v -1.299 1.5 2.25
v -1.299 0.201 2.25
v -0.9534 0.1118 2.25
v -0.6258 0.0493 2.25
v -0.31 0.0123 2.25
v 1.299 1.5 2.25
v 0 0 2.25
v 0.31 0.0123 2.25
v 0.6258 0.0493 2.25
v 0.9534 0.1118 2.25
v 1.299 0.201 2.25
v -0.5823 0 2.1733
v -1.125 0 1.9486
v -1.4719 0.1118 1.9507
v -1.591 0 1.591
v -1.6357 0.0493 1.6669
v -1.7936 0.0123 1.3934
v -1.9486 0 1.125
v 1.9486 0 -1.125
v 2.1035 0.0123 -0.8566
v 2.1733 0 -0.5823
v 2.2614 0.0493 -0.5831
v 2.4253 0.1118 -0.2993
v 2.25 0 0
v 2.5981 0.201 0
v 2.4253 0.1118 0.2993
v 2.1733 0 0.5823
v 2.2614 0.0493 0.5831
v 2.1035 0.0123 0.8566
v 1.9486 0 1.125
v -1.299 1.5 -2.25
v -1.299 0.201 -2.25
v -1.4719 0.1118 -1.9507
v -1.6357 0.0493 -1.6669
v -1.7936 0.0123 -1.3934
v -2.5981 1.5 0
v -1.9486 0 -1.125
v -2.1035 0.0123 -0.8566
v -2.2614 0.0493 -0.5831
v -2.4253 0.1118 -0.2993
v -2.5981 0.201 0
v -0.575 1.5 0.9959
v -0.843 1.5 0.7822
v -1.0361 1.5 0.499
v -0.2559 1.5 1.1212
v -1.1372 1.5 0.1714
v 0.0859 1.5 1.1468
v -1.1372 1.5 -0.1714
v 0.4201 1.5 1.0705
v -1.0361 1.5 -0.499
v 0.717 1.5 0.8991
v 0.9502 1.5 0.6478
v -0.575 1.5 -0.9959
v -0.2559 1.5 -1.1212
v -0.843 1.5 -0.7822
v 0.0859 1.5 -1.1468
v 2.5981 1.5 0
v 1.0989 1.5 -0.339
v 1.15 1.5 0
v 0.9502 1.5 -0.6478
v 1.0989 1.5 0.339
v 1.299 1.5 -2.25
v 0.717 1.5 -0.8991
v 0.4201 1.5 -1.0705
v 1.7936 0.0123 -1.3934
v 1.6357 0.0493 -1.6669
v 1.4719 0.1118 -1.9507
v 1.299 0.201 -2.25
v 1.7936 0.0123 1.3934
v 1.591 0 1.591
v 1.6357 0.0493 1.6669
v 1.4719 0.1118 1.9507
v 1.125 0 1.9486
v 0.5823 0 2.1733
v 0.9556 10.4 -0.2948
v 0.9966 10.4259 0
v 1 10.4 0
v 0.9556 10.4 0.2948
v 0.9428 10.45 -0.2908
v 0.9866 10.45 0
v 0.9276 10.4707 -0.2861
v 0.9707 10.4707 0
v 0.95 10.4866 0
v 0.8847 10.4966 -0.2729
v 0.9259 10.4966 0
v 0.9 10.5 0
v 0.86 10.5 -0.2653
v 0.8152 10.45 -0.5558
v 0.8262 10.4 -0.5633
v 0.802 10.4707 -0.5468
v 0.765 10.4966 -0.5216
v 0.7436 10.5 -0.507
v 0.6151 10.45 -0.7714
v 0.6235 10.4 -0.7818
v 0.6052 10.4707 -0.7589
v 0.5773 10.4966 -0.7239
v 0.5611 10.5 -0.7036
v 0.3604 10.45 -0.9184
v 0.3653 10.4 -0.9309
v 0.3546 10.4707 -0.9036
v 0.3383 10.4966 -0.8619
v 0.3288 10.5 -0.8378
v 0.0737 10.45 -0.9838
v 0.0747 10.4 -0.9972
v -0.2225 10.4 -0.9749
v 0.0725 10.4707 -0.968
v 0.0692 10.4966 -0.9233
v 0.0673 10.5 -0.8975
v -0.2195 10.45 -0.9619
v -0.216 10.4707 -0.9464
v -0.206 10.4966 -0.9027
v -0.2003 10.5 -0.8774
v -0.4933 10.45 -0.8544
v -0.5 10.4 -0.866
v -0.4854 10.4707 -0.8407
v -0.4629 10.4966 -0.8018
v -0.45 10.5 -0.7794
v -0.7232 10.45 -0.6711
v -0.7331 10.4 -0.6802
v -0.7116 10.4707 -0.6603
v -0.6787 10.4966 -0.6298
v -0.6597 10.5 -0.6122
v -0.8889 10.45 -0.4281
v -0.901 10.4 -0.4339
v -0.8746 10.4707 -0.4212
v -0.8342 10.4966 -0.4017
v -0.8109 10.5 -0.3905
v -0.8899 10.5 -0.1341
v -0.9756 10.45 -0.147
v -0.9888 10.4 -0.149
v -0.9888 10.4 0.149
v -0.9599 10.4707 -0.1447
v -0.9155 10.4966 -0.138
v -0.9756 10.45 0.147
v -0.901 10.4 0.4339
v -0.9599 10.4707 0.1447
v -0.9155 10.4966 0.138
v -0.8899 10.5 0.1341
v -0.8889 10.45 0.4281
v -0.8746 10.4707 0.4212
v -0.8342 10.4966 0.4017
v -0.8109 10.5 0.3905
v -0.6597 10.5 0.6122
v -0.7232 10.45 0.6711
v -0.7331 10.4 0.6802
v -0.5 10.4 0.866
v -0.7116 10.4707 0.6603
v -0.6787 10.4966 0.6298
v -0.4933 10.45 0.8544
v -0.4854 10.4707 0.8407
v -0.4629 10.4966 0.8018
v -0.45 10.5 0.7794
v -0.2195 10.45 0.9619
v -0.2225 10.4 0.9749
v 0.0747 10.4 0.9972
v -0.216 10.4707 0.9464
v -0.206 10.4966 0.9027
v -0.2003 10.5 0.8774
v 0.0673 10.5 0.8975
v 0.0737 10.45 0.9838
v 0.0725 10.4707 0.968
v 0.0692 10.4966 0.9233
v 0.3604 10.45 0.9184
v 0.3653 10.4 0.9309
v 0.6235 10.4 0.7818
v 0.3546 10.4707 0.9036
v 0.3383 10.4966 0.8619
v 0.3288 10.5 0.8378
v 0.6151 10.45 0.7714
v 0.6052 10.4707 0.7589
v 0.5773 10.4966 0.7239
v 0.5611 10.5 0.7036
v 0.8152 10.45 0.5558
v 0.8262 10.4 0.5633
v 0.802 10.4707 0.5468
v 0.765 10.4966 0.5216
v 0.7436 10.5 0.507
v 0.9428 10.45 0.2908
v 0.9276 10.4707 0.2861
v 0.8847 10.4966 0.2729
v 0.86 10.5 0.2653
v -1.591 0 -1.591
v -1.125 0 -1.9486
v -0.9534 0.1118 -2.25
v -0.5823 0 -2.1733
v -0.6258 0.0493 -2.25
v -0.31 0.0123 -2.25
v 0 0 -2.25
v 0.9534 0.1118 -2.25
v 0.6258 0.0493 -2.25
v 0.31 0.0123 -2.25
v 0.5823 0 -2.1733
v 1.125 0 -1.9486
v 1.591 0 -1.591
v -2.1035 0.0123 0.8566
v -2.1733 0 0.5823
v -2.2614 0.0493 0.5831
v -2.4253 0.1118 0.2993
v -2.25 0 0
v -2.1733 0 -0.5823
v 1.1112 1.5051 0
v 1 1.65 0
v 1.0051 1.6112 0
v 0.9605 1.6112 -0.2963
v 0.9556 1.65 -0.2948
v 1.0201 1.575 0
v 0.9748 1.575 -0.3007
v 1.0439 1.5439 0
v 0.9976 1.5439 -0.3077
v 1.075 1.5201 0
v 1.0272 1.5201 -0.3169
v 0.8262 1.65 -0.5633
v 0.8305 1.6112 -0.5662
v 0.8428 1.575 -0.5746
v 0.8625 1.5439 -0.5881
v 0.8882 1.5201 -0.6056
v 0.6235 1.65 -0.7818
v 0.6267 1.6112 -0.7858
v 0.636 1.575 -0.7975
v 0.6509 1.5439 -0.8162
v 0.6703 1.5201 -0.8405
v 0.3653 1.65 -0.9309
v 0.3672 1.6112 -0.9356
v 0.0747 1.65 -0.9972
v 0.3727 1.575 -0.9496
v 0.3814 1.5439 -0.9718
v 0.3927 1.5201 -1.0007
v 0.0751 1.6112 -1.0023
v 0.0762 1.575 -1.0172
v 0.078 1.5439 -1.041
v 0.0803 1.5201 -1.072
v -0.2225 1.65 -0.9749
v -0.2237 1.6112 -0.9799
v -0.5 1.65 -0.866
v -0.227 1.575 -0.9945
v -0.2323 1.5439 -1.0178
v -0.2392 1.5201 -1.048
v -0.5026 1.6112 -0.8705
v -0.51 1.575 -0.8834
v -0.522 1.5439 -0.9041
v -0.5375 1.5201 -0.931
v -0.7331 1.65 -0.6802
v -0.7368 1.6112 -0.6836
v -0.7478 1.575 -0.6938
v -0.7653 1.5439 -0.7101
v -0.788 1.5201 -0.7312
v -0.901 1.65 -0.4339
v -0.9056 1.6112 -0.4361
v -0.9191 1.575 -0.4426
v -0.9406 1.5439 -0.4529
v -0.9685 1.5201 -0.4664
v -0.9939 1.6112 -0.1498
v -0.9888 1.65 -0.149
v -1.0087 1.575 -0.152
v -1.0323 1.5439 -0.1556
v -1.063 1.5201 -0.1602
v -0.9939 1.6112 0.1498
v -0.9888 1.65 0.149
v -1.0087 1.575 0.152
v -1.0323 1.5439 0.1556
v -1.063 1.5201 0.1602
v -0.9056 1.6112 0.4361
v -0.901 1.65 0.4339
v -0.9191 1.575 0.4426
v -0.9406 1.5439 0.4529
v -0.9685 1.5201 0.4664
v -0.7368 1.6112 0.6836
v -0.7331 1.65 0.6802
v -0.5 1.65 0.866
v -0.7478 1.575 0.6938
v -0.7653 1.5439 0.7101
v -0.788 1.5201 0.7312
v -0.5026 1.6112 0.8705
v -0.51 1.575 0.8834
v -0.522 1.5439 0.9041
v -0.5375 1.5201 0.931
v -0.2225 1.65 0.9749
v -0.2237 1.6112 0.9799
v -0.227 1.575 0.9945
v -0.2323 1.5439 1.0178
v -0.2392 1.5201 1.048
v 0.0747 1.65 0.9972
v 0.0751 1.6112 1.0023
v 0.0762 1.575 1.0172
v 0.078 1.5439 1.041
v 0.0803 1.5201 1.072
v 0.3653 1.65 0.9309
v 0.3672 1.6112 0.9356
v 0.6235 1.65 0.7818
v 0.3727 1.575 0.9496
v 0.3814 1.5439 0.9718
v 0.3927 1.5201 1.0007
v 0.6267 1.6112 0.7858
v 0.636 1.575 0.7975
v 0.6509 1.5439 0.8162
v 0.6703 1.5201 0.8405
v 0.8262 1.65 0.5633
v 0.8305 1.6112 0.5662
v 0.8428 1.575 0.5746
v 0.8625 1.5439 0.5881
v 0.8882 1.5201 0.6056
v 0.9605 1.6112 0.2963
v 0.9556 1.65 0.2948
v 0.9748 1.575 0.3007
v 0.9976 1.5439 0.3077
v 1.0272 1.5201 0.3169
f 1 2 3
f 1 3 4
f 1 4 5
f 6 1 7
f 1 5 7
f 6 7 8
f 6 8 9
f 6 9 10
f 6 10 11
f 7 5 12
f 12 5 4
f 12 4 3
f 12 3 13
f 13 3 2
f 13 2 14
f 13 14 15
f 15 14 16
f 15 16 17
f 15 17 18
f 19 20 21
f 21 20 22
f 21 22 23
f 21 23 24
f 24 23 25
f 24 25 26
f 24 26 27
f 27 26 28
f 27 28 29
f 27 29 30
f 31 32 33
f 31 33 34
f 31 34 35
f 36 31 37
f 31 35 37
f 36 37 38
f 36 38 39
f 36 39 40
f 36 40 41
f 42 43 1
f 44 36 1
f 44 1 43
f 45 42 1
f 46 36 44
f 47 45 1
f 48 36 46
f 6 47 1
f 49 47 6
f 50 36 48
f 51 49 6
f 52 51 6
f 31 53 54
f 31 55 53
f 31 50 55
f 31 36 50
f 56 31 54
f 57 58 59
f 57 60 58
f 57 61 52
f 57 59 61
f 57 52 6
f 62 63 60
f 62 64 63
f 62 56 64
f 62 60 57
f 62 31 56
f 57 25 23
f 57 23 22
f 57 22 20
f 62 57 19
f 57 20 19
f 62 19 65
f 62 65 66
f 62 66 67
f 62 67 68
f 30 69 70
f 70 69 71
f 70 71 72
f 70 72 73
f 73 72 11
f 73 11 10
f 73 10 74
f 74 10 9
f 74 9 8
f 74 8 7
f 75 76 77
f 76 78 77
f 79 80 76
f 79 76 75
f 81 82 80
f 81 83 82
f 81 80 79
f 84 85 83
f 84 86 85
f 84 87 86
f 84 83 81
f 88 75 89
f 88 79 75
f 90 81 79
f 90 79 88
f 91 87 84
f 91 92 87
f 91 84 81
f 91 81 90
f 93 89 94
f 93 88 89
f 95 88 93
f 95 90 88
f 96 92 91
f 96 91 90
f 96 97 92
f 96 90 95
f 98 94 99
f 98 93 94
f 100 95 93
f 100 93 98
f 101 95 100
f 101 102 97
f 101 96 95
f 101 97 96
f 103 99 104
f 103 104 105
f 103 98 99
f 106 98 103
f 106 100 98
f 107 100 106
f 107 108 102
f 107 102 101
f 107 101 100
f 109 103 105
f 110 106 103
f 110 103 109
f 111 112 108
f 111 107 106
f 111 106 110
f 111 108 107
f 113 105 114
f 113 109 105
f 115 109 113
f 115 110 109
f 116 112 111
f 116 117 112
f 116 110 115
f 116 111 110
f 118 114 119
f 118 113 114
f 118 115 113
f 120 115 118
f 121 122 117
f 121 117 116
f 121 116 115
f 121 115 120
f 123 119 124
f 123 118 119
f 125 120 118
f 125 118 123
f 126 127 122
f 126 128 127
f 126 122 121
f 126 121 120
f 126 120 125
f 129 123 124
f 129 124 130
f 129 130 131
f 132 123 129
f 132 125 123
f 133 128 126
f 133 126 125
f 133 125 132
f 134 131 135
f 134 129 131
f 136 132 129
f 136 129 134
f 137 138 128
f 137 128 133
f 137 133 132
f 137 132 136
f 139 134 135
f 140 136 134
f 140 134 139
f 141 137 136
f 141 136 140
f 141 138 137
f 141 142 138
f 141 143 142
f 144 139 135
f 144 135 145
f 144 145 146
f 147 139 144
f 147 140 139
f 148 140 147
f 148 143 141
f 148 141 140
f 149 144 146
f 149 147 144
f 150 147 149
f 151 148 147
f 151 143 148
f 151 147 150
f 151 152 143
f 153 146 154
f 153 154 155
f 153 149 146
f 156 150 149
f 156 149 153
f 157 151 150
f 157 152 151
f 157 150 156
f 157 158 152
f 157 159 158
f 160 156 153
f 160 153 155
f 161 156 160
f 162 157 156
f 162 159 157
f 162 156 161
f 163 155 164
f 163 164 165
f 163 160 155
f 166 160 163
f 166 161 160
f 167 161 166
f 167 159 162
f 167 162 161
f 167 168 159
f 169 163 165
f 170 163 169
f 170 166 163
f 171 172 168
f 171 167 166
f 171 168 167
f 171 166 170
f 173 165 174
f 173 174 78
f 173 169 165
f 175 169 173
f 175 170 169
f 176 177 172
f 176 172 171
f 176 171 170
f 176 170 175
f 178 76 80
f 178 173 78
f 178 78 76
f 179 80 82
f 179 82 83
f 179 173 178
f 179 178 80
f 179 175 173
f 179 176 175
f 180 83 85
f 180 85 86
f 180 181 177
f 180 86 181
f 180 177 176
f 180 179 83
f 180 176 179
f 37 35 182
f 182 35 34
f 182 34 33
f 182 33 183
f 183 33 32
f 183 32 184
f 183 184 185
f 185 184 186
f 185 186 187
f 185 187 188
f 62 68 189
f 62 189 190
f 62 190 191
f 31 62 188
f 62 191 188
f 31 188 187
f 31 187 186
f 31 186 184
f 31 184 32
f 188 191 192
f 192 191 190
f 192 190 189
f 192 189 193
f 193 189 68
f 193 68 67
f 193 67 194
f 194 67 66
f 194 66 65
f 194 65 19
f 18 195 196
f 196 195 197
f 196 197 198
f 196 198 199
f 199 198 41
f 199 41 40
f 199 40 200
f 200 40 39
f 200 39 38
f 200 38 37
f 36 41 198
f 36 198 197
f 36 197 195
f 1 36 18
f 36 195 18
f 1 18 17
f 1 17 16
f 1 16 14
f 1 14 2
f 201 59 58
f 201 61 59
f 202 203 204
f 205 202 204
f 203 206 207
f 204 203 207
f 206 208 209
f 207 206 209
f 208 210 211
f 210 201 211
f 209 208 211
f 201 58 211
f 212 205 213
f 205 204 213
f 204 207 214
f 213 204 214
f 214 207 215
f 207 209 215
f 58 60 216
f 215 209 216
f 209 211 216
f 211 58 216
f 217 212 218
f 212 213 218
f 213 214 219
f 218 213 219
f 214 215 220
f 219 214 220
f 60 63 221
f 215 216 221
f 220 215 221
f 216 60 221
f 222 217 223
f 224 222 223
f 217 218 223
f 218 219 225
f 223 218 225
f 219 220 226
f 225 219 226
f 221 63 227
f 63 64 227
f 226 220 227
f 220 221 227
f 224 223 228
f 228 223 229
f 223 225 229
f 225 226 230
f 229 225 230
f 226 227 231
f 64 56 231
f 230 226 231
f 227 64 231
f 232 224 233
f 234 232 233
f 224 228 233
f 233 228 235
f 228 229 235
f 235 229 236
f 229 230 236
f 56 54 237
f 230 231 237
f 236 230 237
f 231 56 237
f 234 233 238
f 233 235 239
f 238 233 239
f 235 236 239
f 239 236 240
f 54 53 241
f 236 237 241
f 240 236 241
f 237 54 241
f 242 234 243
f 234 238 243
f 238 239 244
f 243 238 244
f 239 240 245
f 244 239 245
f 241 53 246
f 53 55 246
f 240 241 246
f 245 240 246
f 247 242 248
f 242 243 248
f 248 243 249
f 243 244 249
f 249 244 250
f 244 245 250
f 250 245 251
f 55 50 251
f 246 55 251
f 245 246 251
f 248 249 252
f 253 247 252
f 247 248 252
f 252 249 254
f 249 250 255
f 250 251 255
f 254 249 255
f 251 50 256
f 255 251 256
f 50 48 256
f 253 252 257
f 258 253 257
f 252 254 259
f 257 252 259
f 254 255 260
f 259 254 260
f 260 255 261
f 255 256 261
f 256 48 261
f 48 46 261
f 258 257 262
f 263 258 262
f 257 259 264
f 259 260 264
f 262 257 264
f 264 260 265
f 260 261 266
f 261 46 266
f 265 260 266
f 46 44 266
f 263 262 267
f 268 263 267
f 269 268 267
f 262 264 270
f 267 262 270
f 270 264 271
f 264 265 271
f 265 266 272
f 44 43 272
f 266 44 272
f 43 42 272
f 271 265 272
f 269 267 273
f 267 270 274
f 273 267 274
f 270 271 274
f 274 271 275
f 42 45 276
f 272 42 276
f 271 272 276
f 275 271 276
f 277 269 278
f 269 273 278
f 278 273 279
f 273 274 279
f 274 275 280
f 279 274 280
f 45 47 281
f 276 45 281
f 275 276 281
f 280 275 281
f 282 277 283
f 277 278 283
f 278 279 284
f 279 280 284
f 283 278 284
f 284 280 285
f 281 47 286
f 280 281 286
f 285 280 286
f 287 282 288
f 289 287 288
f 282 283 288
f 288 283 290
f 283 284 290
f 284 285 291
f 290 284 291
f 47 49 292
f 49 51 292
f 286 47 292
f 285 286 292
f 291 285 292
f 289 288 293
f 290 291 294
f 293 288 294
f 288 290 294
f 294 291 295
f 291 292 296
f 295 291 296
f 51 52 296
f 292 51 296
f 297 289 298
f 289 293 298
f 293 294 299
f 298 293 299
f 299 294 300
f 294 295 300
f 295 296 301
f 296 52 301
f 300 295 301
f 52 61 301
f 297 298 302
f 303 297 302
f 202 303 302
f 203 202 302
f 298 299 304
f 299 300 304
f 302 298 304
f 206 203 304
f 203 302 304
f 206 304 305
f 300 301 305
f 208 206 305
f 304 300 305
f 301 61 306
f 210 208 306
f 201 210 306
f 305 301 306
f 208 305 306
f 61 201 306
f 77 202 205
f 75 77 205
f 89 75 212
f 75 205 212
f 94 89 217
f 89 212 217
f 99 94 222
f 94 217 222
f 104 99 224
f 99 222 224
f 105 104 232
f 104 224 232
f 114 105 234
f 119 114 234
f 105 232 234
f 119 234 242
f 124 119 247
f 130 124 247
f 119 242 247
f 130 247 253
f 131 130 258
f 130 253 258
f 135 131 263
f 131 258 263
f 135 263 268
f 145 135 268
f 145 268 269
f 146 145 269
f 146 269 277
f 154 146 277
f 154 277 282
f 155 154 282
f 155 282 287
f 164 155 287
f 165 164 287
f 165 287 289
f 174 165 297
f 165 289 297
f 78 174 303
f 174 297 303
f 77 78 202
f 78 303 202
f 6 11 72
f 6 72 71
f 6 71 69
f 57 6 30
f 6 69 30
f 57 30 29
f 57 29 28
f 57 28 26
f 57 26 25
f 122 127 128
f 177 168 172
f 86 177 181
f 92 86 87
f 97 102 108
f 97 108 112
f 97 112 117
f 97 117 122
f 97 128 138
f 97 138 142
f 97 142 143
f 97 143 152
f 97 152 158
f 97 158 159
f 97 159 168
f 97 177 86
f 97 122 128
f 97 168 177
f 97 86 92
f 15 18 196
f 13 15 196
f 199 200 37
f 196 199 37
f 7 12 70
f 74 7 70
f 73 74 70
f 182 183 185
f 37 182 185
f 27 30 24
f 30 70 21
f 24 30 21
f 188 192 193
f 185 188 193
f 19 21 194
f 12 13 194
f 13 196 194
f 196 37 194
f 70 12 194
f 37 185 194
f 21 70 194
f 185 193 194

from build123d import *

# Parameters (mm, degrees)
BOSS_EXTRUDE2_DEPTH = 1.5
SKETCH2_OUTSIDE_W   = 13.8
SKETCH2_OUTSIDE_H   = 13.104
SKETCH2_OUTSIDE_R   = 2.25
CUT_EXTRUDE1_DEPTH  = 1.5
CUT_EXTRUDE1_TAPER  = 60
SKETCH3_R           = 1
BOSS_EXTRUDE3_DEPTH = 9
FILLET1_R           = 0.1
FILLET2_R           = 0.15


with BuildPart() as part:
    # Sketch1 → Boss-Extrude2 (new body)
    with BuildSketch(Plane(origin=(0, 0, 0), x_dir=(1, 0, 0), z_dir=(0, 1, 0))):
        Polygon((2.598076211, 0), (1.299038106, 2.25), (-1.299038106, 2.25), (-2.598076211, 0), (-1.299038106, -2.25), (1.299038106, -2.25), align=None)
    extrude(amount=BOSS_EXTRUDE2_DEPTH)

    # Sketch2 outside → Cut-Extrude1 (cut)
    with BuildSketch(Plane(origin=(0, 0, 0), x_dir=(1, 0, 0), z_dir=(0, 1, 0))):
        Rectangle(SKETCH2_OUTSIDE_W, SKETCH2_OUTSIDE_H)
        Circle(SKETCH2_OUTSIDE_R, mode=Mode.SUBTRACT)
    extrude(amount=CUT_EXTRUDE1_DEPTH, taper=CUT_EXTRUDE1_TAPER, mode=Mode.SUBTRACT)

    # Sketch3 → Boss-Extrude3 (add)
    with BuildSketch(Plane(origin=(0, 1.5, 0), x_dir=(1, 0, 0), z_dir=(0, 1, 0))):
        Circle(SKETCH3_R)
    extrude(amount=BOSS_EXTRUDE3_DEPTH)

    # Fillet1
    fillet1_edges = [part.edges().sort_by_distance(p)[0] for p in [
        (-1, 10.5, 0),
    ]]
    fillet(fillet1_edges, radius=FILLET1_R)

    # Fillet2
    fillet2_edges = [part.edges().sort_by_distance(p)[0] for p in [
        (-1, 1.5, 0),
    ]]
    fillet(fillet2_edges, radius=FILLET2_R)


solid = part.part
